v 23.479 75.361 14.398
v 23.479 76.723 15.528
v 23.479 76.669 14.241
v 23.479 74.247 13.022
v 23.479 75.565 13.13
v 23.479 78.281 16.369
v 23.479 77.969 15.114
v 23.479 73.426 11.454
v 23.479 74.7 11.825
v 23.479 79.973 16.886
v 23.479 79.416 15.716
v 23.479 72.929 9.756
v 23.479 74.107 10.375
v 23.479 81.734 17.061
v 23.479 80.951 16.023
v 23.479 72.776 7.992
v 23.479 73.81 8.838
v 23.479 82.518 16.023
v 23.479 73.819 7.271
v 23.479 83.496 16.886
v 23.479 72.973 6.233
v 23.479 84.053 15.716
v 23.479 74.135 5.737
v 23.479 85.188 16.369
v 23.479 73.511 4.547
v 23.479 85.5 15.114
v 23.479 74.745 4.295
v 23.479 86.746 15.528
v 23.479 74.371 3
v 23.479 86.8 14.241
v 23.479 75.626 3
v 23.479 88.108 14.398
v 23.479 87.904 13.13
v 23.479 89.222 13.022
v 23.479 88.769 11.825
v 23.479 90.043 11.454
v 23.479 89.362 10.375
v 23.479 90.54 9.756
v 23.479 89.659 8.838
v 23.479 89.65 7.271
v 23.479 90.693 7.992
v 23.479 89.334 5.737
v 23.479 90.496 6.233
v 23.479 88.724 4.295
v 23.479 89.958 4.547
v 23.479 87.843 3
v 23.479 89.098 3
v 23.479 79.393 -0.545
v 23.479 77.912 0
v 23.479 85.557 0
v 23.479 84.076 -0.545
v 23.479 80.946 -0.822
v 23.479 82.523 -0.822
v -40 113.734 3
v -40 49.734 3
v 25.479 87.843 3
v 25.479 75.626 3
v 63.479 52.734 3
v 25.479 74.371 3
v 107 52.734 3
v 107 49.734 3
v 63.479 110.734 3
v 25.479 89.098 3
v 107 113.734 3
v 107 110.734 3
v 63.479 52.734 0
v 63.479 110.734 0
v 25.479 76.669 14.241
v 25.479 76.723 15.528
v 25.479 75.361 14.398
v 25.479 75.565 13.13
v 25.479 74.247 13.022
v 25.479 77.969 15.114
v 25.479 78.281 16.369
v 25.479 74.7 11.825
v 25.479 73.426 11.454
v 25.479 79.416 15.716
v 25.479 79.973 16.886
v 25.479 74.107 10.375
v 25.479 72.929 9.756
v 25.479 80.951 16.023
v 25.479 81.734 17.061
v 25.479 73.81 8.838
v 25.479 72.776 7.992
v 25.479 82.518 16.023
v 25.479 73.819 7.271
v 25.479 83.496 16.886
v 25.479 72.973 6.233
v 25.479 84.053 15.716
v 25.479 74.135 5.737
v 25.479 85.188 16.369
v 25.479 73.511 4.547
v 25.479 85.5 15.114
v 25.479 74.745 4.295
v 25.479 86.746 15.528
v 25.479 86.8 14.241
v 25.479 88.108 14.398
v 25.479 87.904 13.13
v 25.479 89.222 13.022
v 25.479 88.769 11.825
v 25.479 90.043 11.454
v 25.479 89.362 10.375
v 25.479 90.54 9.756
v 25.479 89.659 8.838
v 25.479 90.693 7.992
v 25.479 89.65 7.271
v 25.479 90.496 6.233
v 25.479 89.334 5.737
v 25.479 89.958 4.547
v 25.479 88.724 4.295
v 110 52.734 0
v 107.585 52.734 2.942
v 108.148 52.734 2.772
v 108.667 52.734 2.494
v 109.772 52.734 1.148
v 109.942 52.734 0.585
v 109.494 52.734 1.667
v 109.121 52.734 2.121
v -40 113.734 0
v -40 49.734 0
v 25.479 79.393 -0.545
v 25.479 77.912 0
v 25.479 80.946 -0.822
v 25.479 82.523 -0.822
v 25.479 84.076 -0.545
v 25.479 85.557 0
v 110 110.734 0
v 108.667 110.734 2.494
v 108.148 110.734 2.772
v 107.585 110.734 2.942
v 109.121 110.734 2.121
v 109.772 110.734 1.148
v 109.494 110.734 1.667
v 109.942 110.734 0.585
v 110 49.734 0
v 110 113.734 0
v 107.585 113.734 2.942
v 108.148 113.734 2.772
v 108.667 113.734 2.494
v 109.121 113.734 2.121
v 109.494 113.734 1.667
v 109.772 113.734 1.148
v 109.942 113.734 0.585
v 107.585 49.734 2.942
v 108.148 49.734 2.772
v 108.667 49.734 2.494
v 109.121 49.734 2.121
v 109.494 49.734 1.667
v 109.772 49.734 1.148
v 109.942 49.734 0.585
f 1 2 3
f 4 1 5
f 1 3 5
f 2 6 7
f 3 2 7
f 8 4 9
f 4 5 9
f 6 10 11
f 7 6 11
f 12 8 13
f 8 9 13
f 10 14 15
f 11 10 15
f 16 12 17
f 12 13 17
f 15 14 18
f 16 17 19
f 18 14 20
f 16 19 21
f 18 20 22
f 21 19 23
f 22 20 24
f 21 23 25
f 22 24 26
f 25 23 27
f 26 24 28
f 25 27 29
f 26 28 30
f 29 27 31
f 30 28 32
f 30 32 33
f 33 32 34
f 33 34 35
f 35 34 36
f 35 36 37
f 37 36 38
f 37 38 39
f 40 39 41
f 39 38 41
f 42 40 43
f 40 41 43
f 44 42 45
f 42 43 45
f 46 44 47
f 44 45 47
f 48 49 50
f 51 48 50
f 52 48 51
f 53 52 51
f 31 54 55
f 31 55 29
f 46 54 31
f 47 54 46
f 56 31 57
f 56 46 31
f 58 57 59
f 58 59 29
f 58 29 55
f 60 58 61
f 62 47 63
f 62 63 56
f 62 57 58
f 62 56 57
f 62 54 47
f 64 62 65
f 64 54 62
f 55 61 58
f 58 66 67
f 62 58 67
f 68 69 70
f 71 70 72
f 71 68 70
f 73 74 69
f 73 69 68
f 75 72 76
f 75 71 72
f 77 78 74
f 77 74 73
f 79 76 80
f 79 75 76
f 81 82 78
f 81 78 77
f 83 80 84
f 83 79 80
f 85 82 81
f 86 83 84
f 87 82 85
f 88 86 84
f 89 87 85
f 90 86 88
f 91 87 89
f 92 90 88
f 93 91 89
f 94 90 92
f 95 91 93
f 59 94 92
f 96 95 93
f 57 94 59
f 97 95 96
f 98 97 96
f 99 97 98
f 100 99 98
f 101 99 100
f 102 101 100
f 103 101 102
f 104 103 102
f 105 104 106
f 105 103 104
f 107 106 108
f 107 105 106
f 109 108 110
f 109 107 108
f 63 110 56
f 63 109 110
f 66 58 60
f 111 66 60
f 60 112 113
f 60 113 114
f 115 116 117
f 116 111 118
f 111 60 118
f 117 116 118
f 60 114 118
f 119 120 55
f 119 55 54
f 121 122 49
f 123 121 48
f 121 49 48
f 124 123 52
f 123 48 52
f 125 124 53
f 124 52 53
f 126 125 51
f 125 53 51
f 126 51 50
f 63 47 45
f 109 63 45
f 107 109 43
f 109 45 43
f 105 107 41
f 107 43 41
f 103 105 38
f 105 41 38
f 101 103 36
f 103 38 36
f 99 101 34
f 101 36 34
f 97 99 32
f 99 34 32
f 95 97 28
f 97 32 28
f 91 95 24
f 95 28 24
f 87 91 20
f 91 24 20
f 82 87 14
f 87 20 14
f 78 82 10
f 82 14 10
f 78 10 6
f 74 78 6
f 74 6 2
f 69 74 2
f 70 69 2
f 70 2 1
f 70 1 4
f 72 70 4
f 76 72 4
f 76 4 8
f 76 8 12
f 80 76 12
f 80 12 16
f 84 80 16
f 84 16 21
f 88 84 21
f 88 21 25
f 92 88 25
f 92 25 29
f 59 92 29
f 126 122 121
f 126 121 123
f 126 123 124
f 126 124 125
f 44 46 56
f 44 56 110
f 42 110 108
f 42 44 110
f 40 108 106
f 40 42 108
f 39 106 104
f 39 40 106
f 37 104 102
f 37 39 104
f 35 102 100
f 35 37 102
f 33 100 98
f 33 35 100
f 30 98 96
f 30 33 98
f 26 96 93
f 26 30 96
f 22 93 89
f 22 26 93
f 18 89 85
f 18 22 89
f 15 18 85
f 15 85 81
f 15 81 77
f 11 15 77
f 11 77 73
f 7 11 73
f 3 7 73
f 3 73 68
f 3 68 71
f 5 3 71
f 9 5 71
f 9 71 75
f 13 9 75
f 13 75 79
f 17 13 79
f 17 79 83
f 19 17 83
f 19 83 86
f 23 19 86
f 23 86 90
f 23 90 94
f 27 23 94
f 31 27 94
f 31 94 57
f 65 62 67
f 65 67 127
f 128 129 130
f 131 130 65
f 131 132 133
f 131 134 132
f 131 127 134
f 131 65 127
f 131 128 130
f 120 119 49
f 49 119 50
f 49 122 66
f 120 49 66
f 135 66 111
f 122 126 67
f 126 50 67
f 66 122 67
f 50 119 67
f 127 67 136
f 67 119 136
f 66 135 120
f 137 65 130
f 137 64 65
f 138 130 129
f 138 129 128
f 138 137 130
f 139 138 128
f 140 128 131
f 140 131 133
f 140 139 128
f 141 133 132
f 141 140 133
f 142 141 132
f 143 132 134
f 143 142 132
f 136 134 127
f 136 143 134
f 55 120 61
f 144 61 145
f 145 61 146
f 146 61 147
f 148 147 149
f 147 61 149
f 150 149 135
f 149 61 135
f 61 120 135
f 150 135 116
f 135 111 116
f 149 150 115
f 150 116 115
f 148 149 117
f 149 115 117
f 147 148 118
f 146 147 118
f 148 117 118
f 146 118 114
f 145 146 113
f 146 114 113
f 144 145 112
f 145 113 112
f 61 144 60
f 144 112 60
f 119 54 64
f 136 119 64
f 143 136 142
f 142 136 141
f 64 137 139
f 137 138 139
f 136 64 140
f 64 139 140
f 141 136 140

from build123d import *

# Parameters (mm, degrees)
SKETCH1_W           = 103.47926424
SKETCH1_H           = 64
BOSS_EXTRUDE1_DEPTH = 3
SKETCH2_W           = 46.52073576
SKETCH2_H           = 3
BOSS_EXTRUDE2_DEPTH = 3
FILLET1_R           = 3
SKETCH3_R           = 8.958865037
SKETCH3_R_2         = 7.958865037
EXTRUDE_THIN1_DEPTH = 2


with BuildPart() as part:
    # Sketch1 → Boss-Extrude1 (new body)
    with BuildSketch(Plane.XY):
        with Locations((11.73963212, 81.73418814)):
            Rectangle(SKETCH1_W, SKETCH1_H)
    extrude(amount=BOSS_EXTRUDE1_DEPTH)

    # Sketch2 → Boss-Extrude2 (add)
    with BuildSketch(Plane.XY.offset(3)):
        with Locations((86.73963212, 112.23418814)):
            Rectangle(SKETCH2_W, SKETCH2_H)
        with Locations((86.73963212, 51.23418814)):
            Rectangle(SKETCH2_W, SKETCH2_H)
    extrude(amount=-BOSS_EXTRUDE2_DEPTH)

    # Fillet1
    fillet1_edges = [part.edges().sort_by_distance(p)[0] for p in [
        (110, 51.23418814, 3),
        (110, 112.23418814, 3),
    ]]
    fillet(fillet1_edges, radius=FILLET1_R - 0.0001)  # a hair under: the kernel refuses the full size

    # Sketch3 → Extrude-Thin1 (add)
    with BuildSketch(Plane(origin=(23.47926424, 0, 0), x_dir=(0, 0, -1), z_dir=(1, 0, 0))):
        with Locations((-8.102432793, 81.734499249)):
            Circle(SKETCH3_R)
        with Locations((-8.102432793, 81.734499249)):
            Circle(SKETCH3_R_2, mode=Mode.SUBTRACT)
    extrude(amount=EXTRUDE_THIN1_DEPTH)


solid = part.part
